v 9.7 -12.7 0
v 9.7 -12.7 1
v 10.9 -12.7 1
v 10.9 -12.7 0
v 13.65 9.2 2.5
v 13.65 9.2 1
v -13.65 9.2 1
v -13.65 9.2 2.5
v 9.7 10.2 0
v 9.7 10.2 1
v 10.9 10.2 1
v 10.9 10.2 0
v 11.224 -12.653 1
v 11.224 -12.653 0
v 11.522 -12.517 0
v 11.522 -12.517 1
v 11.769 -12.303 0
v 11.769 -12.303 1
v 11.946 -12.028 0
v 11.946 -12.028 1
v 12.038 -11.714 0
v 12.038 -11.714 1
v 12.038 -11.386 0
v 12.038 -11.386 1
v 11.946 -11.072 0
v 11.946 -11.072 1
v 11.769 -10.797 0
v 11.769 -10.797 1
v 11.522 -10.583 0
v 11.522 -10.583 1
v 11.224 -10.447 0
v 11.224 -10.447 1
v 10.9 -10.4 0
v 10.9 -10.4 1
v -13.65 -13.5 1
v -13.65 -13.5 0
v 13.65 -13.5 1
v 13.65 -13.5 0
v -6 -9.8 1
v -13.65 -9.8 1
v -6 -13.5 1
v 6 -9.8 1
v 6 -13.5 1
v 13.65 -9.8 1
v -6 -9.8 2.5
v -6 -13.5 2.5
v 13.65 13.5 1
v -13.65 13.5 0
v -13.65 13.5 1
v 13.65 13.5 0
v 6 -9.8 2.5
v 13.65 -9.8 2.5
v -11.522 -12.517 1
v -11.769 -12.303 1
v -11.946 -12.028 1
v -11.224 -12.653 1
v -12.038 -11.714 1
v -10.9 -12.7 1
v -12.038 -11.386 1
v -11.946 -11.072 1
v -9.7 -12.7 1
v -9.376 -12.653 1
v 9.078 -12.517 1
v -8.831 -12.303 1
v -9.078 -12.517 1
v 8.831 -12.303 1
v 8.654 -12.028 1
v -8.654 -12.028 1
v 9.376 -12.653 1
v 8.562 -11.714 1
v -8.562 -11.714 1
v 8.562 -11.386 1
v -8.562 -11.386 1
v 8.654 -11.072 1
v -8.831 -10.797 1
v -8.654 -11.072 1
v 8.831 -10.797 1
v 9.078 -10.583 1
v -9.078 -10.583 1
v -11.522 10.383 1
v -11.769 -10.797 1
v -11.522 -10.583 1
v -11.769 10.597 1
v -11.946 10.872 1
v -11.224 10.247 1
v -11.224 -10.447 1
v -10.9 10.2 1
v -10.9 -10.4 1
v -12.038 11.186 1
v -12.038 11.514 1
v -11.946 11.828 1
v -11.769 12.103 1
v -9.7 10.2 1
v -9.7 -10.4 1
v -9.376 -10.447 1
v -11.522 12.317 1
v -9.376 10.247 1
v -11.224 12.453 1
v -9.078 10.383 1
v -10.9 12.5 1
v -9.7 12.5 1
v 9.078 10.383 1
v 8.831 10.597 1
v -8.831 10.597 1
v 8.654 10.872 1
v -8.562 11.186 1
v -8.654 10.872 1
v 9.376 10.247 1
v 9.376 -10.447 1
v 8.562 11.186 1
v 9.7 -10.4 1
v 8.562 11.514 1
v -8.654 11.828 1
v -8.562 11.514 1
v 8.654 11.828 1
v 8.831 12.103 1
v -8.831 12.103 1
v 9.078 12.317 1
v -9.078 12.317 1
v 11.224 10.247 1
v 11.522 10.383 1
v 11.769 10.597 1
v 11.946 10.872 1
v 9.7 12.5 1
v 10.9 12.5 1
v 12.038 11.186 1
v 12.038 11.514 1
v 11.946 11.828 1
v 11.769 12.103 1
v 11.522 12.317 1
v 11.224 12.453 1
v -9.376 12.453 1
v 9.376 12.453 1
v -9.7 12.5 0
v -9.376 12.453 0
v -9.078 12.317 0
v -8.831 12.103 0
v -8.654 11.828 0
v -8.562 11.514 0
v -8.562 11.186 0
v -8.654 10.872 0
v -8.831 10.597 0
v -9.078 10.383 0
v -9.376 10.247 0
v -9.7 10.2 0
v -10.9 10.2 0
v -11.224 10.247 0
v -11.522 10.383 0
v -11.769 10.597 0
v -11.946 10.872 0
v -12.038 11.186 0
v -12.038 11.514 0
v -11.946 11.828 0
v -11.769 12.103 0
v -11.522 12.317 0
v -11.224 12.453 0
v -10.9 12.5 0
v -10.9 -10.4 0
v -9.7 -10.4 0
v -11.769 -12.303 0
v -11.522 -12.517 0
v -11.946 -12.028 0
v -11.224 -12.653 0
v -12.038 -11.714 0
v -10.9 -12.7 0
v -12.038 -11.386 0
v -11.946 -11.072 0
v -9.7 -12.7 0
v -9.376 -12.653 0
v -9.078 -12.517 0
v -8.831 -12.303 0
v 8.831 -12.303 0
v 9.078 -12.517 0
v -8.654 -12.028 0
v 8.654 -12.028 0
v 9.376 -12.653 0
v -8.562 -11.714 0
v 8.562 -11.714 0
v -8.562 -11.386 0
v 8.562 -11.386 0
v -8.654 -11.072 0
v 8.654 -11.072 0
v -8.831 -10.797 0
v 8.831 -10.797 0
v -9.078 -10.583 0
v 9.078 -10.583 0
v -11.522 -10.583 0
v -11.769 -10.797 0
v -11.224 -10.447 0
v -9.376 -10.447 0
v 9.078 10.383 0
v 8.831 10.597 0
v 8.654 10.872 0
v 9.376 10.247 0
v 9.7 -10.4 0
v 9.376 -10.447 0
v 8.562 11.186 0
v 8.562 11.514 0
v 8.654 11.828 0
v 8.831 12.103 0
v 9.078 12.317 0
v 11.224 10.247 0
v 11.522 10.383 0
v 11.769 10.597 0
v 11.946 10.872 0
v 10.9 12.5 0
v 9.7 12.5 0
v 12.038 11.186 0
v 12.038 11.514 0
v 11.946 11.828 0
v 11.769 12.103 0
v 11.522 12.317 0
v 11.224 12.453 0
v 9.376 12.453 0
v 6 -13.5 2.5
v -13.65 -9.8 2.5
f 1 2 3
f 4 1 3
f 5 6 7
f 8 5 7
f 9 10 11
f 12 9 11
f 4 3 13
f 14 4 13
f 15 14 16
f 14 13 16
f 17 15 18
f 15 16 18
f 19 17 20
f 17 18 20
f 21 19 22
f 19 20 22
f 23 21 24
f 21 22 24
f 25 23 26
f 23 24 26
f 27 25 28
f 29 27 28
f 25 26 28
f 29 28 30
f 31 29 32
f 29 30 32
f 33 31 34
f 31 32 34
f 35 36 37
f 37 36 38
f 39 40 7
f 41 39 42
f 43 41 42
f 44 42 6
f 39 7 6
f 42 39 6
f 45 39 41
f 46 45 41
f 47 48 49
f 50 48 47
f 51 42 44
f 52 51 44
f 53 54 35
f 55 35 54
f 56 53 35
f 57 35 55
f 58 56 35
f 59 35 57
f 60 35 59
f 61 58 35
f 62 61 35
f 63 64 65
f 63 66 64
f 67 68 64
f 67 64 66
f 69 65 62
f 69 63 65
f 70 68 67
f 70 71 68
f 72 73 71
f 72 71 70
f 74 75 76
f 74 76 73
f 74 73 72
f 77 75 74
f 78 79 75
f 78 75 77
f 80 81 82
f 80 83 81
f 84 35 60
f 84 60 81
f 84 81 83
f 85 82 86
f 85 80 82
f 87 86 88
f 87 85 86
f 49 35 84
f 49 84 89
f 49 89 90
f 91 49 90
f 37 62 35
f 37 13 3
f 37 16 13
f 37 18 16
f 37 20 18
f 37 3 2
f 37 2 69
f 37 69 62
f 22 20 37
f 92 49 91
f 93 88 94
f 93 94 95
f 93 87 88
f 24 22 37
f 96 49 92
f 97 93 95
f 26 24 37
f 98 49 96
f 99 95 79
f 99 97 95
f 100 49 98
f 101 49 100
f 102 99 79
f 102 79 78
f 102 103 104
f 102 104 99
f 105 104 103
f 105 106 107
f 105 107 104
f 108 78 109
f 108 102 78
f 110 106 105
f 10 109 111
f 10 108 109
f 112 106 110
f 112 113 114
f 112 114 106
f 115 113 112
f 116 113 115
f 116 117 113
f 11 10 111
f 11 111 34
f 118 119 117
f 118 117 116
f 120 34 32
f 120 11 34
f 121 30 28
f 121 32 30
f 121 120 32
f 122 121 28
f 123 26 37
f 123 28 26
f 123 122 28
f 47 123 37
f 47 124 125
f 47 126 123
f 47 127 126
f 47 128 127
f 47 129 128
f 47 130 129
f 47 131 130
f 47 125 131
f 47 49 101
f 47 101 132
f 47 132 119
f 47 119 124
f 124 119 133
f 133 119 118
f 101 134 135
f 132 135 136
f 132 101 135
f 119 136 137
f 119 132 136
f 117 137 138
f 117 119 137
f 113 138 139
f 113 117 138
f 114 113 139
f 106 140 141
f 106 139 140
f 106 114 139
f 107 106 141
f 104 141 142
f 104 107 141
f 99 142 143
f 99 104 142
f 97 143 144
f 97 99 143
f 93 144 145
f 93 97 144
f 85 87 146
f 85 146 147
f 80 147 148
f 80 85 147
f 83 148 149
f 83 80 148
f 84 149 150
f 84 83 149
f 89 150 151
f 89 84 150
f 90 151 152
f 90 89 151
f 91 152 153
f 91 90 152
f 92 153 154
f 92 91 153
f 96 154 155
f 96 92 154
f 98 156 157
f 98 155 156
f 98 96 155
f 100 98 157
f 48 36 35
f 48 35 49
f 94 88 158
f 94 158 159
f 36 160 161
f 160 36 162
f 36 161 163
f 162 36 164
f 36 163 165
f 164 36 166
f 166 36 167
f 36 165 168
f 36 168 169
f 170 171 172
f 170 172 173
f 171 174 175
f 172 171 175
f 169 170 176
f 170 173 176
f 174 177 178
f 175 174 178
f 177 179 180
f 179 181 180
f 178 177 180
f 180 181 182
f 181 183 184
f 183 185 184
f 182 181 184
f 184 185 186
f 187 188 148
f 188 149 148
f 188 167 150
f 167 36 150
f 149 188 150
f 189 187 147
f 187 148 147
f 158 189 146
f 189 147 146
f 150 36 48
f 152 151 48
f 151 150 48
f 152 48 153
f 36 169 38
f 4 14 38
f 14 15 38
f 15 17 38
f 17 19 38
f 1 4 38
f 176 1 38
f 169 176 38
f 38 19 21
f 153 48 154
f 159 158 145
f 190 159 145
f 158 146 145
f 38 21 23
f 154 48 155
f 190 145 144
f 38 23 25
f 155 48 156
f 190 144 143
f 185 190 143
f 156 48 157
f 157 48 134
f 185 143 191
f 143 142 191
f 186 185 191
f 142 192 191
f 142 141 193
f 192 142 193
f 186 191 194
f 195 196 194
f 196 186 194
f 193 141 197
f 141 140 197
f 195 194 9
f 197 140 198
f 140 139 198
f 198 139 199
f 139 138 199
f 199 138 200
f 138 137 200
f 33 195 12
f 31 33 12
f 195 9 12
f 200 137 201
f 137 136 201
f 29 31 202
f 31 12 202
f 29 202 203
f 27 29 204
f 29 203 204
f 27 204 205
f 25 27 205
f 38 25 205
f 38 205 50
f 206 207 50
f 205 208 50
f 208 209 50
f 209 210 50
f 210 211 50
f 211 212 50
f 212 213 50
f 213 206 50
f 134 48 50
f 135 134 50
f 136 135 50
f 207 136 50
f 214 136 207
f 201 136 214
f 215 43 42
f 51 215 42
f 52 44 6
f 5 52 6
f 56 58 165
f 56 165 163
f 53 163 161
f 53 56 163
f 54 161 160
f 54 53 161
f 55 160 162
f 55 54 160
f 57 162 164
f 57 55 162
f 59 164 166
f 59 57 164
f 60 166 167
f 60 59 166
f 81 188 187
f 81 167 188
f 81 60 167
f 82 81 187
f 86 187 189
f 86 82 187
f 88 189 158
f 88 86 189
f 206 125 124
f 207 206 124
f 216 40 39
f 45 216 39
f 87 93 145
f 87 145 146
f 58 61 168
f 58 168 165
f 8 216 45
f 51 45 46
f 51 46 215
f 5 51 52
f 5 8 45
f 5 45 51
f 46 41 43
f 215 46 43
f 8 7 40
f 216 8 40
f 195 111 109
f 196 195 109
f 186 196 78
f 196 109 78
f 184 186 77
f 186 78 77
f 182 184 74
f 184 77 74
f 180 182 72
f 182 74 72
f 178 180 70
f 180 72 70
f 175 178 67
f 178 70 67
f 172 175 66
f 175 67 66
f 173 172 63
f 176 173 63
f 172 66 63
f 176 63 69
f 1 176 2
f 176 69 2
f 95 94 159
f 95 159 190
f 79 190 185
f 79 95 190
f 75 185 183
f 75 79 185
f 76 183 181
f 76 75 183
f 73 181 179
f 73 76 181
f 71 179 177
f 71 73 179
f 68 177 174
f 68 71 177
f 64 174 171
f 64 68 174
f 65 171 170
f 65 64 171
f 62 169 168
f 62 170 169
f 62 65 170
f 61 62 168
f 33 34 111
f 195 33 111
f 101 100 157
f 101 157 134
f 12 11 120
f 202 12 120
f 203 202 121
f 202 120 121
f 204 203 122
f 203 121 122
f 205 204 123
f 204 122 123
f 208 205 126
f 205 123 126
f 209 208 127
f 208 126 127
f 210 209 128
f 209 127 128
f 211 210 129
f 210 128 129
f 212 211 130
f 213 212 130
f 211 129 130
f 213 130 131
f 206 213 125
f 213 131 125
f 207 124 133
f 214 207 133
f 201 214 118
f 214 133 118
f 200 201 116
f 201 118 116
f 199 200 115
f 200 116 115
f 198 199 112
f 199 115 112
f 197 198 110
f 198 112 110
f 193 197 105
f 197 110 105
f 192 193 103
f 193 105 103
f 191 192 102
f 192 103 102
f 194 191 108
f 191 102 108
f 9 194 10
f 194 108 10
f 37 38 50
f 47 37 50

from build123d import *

# Parameters (mm, degrees)
SKETCH1_W           = 27.3
SKETCH1_H           = 27
BOSS_EXTRUDE1_DEPTH = 1
BOSS_EXTRUDE2_DEPTH = 1.5
CUT_EXTRUDE1_DEPTH  = 20.256752063


with BuildPart() as part:
    # Sketch1 → Boss-Extrude1 (new body)
    with BuildSketch(Plane.XY):
        Rectangle(SKETCH1_W, SKETCH1_H)
    extrude(amount=BOSS_EXTRUDE1_DEPTH)

    # Sketch3 → Cut-Extrude1 (cut, through all)
    with BuildSketch(Plane.XY.offset(1)):
        with BuildLine():
            Line((-10.9, 12.5), (-9.7, 12.5))
            ThreePointArc((-9.7, 12.5), (-8.55, 11.35), (-9.7, 10.2))
            Line((-9.7, 10.2), (-10.9, 10.2))
            ThreePointArc((-10.9, 10.2), (-12.05, 11.35), (-10.9, 12.5))
        make_face()
        with BuildLine():
            Line((10.9, 12.5), (9.7, 12.5))
            ThreePointArc((9.7, 12.5), (8.55, 11.35), (9.7, 10.2))
            Line((9.7, 10.2), (10.9, 10.2))
            ThreePointArc((10.9, 10.2), (12.05, 11.35), (10.9, 12.5))
        make_face()
        with BuildLine():
            Line((-10.9, -10.4), (-9.7, -10.4))
            ThreePointArc((-9.7, -10.4), (-8.55, -11.55), (-9.7, -12.7))
            Line((-9.7, -12.7), (-10.9, -12.7))
            ThreePointArc((-10.9, -12.7), (-12.05, -11.55), (-10.9, -10.4))
        make_face()
        with BuildLine():
            Line((10.9, -10.4), (9.7, -10.4))
            ThreePointArc((9.7, -10.4), (8.55, -11.55), (9.7, -12.7))
            Line((9.7, -12.7), (10.9, -12.7))
            ThreePointArc((10.9, -12.7), (12.05, -11.55), (10.9, -10.4))
        make_face()
    extrude(amount=-CUT_EXTRUDE1_DEPTH, mode=Mode.SUBTRACT)


with BuildPart() as body_2:
    # Sketch2 → Boss-Extrude2 (new body)
    with BuildSketch(Plane.XY.offset(1)):
        Polygon((-13.65, -9.8), (-6, -9.8), (-6, -13.5), (6, -13.5), (6, -9.8), (13.65, -9.8), (13.65, 9.2), (-13.65, 9.2), align=None)
    extrude(amount=BOSS_EXTRUDE2_DEPTH)


solid = Compound([part.part, body_2.part])
